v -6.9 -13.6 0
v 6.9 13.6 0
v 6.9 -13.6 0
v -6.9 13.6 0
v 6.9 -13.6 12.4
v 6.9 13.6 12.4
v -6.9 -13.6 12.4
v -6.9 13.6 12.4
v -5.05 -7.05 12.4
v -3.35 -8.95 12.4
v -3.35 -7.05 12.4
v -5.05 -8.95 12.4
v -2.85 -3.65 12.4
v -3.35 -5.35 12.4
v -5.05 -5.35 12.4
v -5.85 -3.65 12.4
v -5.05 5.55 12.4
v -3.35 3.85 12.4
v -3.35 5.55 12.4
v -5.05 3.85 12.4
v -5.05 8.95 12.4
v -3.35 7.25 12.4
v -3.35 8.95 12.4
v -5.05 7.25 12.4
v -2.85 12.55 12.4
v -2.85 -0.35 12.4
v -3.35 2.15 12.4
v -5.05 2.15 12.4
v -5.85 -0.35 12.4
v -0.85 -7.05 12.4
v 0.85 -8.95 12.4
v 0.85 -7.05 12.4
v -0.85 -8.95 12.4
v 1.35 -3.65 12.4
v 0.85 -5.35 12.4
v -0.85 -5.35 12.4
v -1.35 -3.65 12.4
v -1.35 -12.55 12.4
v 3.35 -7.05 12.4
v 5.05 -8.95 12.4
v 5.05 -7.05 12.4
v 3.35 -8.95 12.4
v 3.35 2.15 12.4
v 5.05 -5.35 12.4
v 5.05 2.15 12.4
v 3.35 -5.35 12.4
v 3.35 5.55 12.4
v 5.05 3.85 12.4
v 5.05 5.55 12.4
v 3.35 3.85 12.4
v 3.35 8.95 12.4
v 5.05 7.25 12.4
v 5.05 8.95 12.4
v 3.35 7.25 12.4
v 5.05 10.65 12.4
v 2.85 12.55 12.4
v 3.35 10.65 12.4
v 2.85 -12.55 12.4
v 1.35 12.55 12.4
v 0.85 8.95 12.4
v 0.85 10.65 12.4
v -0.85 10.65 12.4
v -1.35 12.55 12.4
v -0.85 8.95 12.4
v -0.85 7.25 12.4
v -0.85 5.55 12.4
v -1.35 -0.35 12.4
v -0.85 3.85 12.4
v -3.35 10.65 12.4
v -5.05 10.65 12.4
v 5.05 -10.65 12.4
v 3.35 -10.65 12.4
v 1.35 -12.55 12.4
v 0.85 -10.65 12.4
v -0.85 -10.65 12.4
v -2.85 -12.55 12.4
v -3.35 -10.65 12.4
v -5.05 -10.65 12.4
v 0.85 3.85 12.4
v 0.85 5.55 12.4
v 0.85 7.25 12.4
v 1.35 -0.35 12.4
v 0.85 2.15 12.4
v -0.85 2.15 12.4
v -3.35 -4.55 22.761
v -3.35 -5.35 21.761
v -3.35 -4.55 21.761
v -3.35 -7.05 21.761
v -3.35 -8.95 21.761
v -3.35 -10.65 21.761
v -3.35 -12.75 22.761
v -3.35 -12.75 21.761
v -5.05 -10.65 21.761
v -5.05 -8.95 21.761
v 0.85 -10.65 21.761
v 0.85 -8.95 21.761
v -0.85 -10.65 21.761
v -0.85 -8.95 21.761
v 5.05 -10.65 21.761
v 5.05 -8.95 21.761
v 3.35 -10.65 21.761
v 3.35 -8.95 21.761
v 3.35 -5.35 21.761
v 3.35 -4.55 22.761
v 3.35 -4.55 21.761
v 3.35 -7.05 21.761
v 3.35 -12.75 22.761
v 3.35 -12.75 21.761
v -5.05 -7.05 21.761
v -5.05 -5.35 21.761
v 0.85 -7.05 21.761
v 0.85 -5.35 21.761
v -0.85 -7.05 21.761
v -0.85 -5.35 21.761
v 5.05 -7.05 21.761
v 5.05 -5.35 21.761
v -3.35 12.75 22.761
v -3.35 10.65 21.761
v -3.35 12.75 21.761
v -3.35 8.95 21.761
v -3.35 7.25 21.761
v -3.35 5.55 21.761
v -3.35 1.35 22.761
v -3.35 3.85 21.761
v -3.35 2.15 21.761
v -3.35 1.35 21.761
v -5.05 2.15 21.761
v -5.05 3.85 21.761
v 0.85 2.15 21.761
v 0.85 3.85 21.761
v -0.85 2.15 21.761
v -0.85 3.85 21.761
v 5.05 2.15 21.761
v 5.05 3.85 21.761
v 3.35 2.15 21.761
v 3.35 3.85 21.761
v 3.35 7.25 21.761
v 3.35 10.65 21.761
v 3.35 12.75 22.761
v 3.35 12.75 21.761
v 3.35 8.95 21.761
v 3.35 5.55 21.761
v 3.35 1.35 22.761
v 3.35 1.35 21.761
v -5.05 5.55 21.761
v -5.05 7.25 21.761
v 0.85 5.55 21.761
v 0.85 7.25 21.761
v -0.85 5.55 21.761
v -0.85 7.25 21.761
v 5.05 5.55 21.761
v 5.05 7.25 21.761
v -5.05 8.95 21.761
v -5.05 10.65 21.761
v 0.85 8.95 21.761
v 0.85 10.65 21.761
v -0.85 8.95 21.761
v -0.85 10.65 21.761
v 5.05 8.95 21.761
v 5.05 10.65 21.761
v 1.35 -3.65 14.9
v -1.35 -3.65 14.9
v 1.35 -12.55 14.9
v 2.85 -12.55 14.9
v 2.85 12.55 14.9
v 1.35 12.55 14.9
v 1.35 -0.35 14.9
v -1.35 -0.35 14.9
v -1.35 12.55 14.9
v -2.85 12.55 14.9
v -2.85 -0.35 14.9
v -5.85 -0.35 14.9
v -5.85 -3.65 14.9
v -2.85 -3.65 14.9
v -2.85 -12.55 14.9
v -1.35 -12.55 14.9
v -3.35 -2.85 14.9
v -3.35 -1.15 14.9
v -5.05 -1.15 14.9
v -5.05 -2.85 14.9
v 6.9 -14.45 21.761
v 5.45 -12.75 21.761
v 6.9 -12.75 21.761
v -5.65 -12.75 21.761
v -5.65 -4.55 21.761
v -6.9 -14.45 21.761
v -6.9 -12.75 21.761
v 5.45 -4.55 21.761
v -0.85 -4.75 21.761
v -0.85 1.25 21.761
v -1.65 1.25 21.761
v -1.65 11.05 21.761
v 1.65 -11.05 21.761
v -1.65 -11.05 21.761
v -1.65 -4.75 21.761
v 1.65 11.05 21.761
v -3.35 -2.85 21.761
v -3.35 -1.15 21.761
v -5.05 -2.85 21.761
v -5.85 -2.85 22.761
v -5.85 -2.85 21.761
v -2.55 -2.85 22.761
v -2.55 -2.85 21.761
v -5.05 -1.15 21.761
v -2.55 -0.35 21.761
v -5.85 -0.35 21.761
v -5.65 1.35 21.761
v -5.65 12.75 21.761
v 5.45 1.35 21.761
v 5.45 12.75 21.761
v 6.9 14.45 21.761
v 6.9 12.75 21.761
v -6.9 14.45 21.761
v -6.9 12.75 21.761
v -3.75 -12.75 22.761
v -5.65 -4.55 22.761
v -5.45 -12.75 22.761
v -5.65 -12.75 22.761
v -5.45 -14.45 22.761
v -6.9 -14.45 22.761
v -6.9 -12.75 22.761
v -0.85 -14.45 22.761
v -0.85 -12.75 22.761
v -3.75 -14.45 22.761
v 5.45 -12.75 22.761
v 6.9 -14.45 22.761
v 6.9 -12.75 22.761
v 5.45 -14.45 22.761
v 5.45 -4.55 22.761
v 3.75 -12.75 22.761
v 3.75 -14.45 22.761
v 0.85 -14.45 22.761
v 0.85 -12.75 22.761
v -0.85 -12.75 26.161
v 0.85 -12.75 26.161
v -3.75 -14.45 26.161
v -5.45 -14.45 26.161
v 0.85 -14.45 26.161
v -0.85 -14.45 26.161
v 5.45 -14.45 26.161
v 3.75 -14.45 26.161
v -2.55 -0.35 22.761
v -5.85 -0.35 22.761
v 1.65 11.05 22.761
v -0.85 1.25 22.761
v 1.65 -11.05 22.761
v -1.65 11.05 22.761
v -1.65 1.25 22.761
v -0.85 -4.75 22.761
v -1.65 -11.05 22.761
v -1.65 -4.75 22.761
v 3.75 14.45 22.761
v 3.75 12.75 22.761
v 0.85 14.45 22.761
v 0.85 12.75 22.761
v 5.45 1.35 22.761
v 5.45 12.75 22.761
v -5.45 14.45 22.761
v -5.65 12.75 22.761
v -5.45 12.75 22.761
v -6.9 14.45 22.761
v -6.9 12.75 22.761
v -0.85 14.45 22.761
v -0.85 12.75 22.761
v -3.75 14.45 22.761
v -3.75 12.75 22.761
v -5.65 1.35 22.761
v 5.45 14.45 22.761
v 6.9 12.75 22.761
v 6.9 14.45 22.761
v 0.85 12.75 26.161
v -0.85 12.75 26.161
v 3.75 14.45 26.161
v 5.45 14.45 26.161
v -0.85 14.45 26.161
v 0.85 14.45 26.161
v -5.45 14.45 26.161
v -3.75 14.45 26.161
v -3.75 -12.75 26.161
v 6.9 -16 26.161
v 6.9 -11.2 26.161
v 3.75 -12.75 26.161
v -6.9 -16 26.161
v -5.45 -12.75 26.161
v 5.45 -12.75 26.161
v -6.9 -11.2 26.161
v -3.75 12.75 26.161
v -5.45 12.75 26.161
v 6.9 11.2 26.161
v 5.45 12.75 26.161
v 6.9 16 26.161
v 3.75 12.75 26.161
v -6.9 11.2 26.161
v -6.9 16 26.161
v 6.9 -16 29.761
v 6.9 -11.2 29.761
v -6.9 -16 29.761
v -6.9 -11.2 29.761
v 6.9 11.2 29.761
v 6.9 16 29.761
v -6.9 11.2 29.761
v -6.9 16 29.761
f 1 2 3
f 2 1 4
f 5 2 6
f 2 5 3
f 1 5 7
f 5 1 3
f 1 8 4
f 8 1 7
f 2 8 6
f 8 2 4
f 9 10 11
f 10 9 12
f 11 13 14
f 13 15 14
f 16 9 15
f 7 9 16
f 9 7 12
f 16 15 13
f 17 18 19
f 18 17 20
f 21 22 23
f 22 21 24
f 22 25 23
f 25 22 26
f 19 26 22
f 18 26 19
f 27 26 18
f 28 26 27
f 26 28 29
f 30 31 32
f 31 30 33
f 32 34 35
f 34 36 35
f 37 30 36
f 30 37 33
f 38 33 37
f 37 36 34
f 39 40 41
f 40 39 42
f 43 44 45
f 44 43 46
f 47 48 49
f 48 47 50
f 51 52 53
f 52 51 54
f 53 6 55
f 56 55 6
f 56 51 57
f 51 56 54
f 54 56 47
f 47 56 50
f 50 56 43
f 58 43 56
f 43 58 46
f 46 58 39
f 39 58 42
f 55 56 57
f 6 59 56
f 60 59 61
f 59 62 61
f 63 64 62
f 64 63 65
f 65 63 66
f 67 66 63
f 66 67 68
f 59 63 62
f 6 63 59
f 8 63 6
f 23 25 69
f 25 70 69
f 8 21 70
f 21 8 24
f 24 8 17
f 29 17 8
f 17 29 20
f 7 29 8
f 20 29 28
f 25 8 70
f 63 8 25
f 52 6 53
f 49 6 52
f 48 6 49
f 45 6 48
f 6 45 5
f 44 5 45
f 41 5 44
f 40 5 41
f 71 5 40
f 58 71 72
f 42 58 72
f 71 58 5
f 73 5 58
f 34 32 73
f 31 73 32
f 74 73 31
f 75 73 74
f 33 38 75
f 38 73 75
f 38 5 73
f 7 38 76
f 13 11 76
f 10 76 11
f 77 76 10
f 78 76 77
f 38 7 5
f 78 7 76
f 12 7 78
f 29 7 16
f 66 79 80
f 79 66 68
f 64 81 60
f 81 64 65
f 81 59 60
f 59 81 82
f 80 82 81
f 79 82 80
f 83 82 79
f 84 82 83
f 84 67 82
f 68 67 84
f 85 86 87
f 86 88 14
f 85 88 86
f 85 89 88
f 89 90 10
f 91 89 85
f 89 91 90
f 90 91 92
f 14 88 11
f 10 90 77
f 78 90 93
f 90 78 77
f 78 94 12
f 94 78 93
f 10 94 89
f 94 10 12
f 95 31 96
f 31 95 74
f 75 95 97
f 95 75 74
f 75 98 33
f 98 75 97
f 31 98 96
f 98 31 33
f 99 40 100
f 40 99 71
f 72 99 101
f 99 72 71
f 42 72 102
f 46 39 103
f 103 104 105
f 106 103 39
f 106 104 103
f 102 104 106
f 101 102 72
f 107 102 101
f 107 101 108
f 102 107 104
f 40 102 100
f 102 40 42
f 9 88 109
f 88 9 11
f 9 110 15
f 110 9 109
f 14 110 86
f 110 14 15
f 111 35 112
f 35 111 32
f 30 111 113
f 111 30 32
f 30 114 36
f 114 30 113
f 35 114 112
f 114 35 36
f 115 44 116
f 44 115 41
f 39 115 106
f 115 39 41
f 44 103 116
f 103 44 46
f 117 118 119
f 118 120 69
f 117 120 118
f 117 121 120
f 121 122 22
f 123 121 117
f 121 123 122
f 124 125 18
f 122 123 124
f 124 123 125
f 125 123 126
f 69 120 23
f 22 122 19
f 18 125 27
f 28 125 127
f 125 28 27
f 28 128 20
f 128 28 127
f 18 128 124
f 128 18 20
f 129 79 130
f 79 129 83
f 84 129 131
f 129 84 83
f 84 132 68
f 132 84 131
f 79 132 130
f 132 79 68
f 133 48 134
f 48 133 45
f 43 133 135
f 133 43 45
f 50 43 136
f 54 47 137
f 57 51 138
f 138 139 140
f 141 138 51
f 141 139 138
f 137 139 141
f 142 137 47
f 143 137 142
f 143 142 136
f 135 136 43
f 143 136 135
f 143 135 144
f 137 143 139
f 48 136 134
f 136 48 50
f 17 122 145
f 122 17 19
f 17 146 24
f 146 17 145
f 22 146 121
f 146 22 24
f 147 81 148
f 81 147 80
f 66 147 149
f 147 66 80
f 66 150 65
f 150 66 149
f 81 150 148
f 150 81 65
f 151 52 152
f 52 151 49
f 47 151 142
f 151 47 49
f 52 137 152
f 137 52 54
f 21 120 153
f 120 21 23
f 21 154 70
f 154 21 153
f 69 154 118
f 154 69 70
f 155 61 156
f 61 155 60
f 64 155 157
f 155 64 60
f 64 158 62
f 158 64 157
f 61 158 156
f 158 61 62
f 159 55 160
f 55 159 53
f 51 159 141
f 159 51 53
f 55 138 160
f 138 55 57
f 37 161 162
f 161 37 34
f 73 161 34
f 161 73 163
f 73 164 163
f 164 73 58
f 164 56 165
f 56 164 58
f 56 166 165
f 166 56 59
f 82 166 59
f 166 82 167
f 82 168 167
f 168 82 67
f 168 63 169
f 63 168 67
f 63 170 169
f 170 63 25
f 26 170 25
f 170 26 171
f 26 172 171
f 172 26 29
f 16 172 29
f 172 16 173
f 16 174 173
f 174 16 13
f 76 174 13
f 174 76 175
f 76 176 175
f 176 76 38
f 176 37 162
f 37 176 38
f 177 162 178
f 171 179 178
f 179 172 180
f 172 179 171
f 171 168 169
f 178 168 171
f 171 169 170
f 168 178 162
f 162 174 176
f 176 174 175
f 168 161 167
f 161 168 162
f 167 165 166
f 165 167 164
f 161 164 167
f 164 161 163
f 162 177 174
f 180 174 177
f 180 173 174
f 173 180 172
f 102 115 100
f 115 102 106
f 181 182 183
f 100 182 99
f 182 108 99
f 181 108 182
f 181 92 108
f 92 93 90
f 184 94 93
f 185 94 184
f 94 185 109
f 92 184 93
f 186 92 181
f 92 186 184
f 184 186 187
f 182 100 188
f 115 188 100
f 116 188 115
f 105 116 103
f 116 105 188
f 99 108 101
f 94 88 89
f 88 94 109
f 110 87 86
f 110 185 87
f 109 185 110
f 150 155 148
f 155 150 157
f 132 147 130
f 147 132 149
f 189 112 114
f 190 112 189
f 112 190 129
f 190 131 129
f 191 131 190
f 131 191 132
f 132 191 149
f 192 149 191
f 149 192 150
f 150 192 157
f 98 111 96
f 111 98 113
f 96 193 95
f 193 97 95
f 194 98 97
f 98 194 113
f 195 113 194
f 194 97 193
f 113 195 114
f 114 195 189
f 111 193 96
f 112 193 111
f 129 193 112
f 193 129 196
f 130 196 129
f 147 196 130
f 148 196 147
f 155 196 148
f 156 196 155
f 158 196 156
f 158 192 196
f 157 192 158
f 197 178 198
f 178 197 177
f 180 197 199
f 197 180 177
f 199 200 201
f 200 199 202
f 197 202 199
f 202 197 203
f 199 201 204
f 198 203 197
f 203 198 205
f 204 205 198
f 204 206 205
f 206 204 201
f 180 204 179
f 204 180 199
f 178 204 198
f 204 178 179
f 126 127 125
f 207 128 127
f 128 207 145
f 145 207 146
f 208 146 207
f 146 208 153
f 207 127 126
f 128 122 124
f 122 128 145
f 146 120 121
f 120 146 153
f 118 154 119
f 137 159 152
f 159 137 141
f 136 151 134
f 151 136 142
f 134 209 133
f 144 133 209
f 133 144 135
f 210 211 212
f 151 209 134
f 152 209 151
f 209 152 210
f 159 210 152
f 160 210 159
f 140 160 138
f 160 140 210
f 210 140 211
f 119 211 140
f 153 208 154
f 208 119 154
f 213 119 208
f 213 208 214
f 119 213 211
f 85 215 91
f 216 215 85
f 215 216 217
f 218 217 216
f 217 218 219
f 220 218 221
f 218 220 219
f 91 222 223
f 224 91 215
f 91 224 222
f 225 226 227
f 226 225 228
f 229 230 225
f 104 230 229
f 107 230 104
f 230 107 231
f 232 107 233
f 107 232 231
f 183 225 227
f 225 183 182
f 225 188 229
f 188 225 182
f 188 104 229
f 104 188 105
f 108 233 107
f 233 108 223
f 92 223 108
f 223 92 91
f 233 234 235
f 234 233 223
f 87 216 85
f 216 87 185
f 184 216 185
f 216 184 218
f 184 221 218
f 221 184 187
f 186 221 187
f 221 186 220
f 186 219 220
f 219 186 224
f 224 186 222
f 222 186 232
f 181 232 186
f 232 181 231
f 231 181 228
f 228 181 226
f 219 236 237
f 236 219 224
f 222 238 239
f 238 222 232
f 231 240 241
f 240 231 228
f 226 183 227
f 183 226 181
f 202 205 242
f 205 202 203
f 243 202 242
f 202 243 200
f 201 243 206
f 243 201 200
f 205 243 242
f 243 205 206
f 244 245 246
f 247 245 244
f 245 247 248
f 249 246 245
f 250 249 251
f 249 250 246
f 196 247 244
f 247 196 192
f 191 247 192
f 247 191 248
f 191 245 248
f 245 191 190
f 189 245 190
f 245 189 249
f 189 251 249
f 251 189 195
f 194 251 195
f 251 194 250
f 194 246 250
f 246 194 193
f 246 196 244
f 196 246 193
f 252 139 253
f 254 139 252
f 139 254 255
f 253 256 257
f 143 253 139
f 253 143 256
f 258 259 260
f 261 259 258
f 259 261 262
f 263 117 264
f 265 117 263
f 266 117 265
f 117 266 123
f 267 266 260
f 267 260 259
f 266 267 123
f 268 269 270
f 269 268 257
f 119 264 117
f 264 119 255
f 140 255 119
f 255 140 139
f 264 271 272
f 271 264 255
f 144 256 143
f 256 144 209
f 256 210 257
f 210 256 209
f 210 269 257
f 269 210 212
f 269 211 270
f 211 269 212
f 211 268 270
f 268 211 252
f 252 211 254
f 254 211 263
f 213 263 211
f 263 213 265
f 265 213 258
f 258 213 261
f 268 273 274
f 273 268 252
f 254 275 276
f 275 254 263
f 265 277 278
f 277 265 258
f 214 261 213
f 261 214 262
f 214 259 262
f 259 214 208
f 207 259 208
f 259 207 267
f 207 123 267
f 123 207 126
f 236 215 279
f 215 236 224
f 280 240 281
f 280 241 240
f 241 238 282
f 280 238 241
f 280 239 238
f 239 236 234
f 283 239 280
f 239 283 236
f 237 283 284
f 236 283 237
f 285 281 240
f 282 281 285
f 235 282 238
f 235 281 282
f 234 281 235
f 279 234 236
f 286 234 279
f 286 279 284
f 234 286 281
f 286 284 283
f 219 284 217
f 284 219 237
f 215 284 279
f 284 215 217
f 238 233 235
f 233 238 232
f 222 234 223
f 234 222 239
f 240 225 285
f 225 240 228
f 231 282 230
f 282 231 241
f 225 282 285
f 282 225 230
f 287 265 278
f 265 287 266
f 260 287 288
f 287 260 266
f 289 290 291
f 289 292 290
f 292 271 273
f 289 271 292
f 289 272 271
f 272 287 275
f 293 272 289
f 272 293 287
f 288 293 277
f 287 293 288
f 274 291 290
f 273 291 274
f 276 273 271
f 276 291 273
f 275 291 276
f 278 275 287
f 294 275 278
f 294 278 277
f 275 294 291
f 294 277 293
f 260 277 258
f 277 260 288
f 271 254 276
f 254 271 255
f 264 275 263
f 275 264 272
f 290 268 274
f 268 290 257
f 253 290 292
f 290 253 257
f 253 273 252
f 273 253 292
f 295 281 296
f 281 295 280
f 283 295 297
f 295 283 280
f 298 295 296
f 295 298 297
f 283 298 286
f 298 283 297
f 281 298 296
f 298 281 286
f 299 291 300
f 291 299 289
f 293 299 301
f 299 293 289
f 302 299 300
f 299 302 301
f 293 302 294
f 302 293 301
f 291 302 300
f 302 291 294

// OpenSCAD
// Generated by SolidPython 0.4.2 on 2020-09-29 23:20:58
//!OpenSCAD

scale(v = 0.0100000000) {
	translate(v = [-690, -1360, 0]) {
		union() {
			color(c = [0.4000000000, 0.4000000000, 0.4000000000]) {
				translate(v = [0, 0, 0]) {
					linear_extrude(height = 1000.0000000000) {
						polygon(paths = [[0, 1, 2, 3]], points = [[0, 0], [0, 2720], [1380, 2720], [1380, 0]]);
					}
				}
			}
			color(c = [0.2000000000, 0.6000000000, 0.2000000000]) {
				translate(v = [0, 0, 1000.0000000000]) {
					linear_extrude(height = 120.0000000000) {
						polygon(paths = [[0, 1, 2, 3]], points = [[0, 1305], [0, 2720], [1380, 2720], [1380, 1305]]);
					}
				}
			}
			color(c = [0.4000000000, 0.4000000000, 0.4000000000]) {
				translate(v = [0, 0, 1000.0000000000]) {
					linear_extrude(height = 120.0000000000) {
						polygon(paths = [[0, 1, 2, 3]], points = [[0, 0], [0, 1305], [1380, 1305], [1380, 0]]);
					}
				}
			}
			color(c = [0.9000000000, 0.6000000000, 0.6000000000]) {
				translate(v = [0, 0, 1120.0000000000]) {
					linear_extrude(height = 120.0000000000) {
						polygon(paths = [[0, 1, 2, 3]], points = [[145, 1485], [145, 2485], [405, 2485], [405, 1485]]);
					}
				}
			}
			color(c = [0.9000000000, 0.6000000000, 0.6000000000]) {
				translate(v = [0, 0, 1120.0000000000]) {
					linear_extrude(height = 120.0000000000) {
						polygon(paths = [[0, 1, 2, 3]], points = [[555, 1485], [555, 2485], [825, 2485], [825, 1485]]);
					}
				}
			}
			color(c = [0.9000000000, 0.6000000000, 0.6000000000]) {
				translate(v = [0, 0, 1120.0000000000]) {
					linear_extrude(height = 120.0000000000) {
						polygon(paths = [[0, 1, 2, 3]], points = [[975, 1485], [975, 2485], [1235, 2485], [1235, 1485]]);
					}
				}
			}
			color(c = [0.9000000000, 0.6000000000, 0.9000000000]) {
				translate(v = [0, 0, 1120.0000000000]) {
					linear_extrude(height = 120.0000000000) {
						polygon(paths = [[0, 1, 2, 3]], points = [[145, 235], [145, 885], [405, 885], [405, 235]]);
					}
				}
			}
			color(c = [0.9000000000, 0.6000000000, 0.9000000000]) {
				translate(v = [0, 0, 1120.0000000000]) {
					linear_extrude(height = 120.0000000000) {
						polygon(paths = [[0, 1, 2, 3]], points = [[555, 235], [555, 885], [825, 885], [825, 235]]);
					}
				}
			}
			color(c = [0.9000000000, 0.6000000000, 0.9000000000]) {
				translate(v = [0, 0, 1120.0000000000]) {
					linear_extrude(height = 120.0000000000) {
						polygon(paths = [[0, 1, 2, 3]], points = [[975, 235], [975, 885], [1235, 885], [1235, 235]]);
					}
				}
			}
			color(c = [0.2000000000, 0.6000000000, 0.2000000000]) {
				translate(v = [0, 0, 1120.0000000000]) {
					linear_extrude(height = 120.0000000000) {
						difference() {
							polygon(paths = [[0, 1, 2, 3]], points = [[0, 1305], [0, 2720], [1380, 2720], [1380, 1305]]);
							polygon(paths = [[0, 1, 2, 3]], points = [[145, 1485], [405, 1485], [405, 2485], [145, 2485]]);
							polygon(paths = [[0, 1, 2, 3]], points = [[555, 1485], [825, 1485], [825, 2485], [555, 2485]]);
							polygon(paths = [[0, 1, 2, 3]], points = [[975, 1485], [1235, 1485], [1235, 2485], [975, 2485]]);
						}
					}
				}
			}
			color(c = [0.4000000000, 0.4000000000, 0.4000000000]) {
				translate(v = [0, 0, 1120.0000000000]) {
					linear_extrude(height = 120.0000000000) {
						difference() {
							polygon(paths = [[0, 1, 2, 3]], points = [[0, 0], [0, 1305], [1380, 1305], [1380, 0]]);
							polygon(paths = [[0, 1, 2, 3]], points = [[145, 235], [405, 235], [405, 885], [145, 885]]);
							polygon(paths = [[0, 1, 2, 3]], points = [[555, 235], [825, 235], [825, 885], [555, 885]]);
							polygon(paths = [[0, 1, 2, 3]], points = [[975, 235], [1235, 235], [1235, 885], [975, 885]]);
						}
					}
				}
			}
			color(c = [0.1000000000, 0.1000000000, 0.1000000000]) {
				translate(v = [0, 0, 1240.0000000000]) {
					linear_extrude(height = 70.0000000000) {
						polygon(paths = [[0, 1, 2, 3]], points = [[185, 295], [185, 465], [355, 465], [355, 295]]);
					}
				}
			}
			color(c = [0.1000000000, 0.1000000000, 0.1000000000]) {
				translate(v = [0, 0, 1240.0000000000]) {
					linear_extrude(height = 70.0000000000) {
						polygon(paths = [[0, 1, 2, 3]], points = [[605, 295], [605, 465], [775, 465], [775, 295]]);
					}
				}
			}
			color(c = [0.1000000000, 0.1000000000, 0.1000000000]) {
				translate(v = [0, 0, 1240.0000000000]) {
					linear_extrude(height = 70.0000000000) {
						polygon(paths = [[0, 1, 2, 3]], points = [[1025, 295], [1025, 465], [1195, 465], [1195, 295]]);
					}
				}
			}
			color(c = [0.1000000000, 0.1000000000, 0.1000000000]) {
				translate(v = [0, 0, 1240.0000000000]) {
					linear_extrude(height = 70.0000000000) {
						polygon(paths = [[0, 1, 2, 3]], points = [[185, 655], [185, 825], [355, 825], [355, 655]]);
					}
				}
			}
			color(c = [0.1000000000, 0.1000000000, 0.1000000000]) {
				translate(v = [0, 0, 1240.0000000000]) {
					linear_extrude(height = 70.0000000000) {
						polygon(paths = [[0, 1, 2, 3]], points = [[605, 655], [605, 825], [775, 825], [775, 655]]);
					}
				}
			}
			color(c = [0.1000000000, 0.1000000000, 0.1000000000]) {
				translate(v = [0, 0, 1240.0000000000]) {
					linear_extrude(height = 70.0000000000) {
						polygon(paths = [[0, 1, 2, 3]], points = [[1025, 655], [1025, 825], [1195, 825], [1195, 655]]);
					}
				}
			}
			color(c = [0.1000000000, 0.1000000000, 0.1000000000]) {
				translate(v = [0, 0, 1240.0000000000]) {
					linear_extrude(height = 70.0000000000) {
						polygon(paths = [[0, 1, 2, 3]], points = [[185, 1575], [185, 1745], [355, 1745], [355, 1575]]);
					}
				}
			}
			color(c = [0.1000000000, 0.1000000000, 0.1000000000]) {
				translate(v = [0, 0, 1240.0000000000]) {
					linear_extrude(height = 70.0000000000) {
						polygon(paths = [[0, 1, 2, 3]], points = [[605, 1575], [605, 1745], [775, 1745], [775, 1575]]);
					}
				}
			}
			color(c = [0.1000000000, 0.1000000000, 0.1000000000]) {
				translate(v = [0, 0, 1240.0000000000]) {
					linear_extrude(height = 70.0000000000) {
						polygon(paths = [[0, 1, 2, 3]], points = [[1025, 1575], [1025, 1745], [1195, 1745], [1195, 1575]]);
					}
				}
			}
			color(c = [0.1000000000, 0.1000000000, 0.1000000000]) {
				translate(v = [0, 0, 1240.0000000000]) {
					linear_extrude(height = 70.0000000000) {
						polygon(paths = [[0, 1, 2, 3]], points = [[185, 1915], [185, 2085], [355, 2085], [355, 1915]]);
					}
				}
			}
			color(c = [0.1000000000, 0.1000000000, 0.1000000000]) {
				translate(v = [0, 0, 1240.0000000000]) {
					linear_extrude(height = 70.0000000000) {
						polygon(paths = [[0, 1, 2, 3]], points = [[605, 1915], [605, 2085], [775, 2085], [775, 1915]]);
					}
				}
			}
			color(c = [0.1000000000, 0.1000000000, 0.1000000000]) {
				translate(v = [0, 0, 1240.0000000000]) {
					linear_extrude(height = 70.0000000000) {
						polygon(paths = [[0, 1, 2, 3]], points = [[1025, 1915], [1025, 2085], [1195, 2085], [1195, 1915]]);
					}
				}
			}
			color(c = [0.1000000000, 0.1000000000, 0.1000000000]) {
				translate(v = [0, 0, 1240.0000000000]) {
					linear_extrude(height = 70.0000000000) {
						polygon(paths = [[0, 1, 2, 3]], points = [[185, 2255], [185, 2425], [355, 2425], [355, 2255]]);
					}
				}
			}
			color(c = [0.1000000000, 0.1000000000, 0.1000000000]) {
				translate(v = [0, 0, 1240.0000000000]) {
					linear_extrude(height = 70.0000000000) {
						polygon(paths = [[0, 1, 2, 3]], points = [[605, 2255], [605, 2425], [775, 2425], [775, 2255]]);
					}
				}
			}
			color(c = [0.1000000000, 0.1000000000, 0.1000000000]) {
				translate(v = [0, 0, 1240.0000000000]) {
					linear_extrude(height = 70.0000000000) {
						polygon(paths = [[0, 1, 2, 3]], points = [[1025, 2255], [1025, 2425], [1195, 2425], [1195, 2255]]);
					}
				}
			}
			color(c = [1.0000000000, 1.0000000000, 1.0000000000]) {
				translate(v = [0, 0, 1240.0000000000]) {
					linear_extrude(height = 70.0000000000) {
						polygon(paths = [[0, 1, 2, 3, 4, 5, 6, 7, 8, 9, 10, 11, 12, 13, 14, 15]], points = [[405, 105], [405, 995], [105, 995], [105, 1325], [405, 1325], [405, 2615], [555, 2615], [555, 1325], [825, 1325], [825, 2615], [975, 2615], [975, 105], [825, 105], [825, 995], [555, 995], [555, 105]]);
					}
				}
			}
			color(c = [0.1000000000, 0.1000000000, 0.1000000000]) {
				translate(v = [0, 0, 1310.0000000000]) {
					linear_extrude(height = 180.0000000000) {
						polygon(paths = [[0, 1, 2, 3]], points = [[185, 295], [185, 465], [355, 465], [355, 295]]);
					}
				}
			}
			color(c = [0.1000000000, 0.1000000000, 0.1000000000]) {
				translate(v = [0, 0, 1310.0000000000]) {
					linear_extrude(height = 180.0000000000) {
						polygon(paths = [[0, 1, 2, 3]], points = [[605, 295], [605, 465], [775, 465], [775, 295]]);
					}
				}
			}
			color(c = [0.1000000000, 0.1000000000, 0.1000000000]) {
				translate(v = [0, 0, 1310.0000000000]) {
					linear_extrude(height = 180.0000000000) {
						polygon(paths = [[0, 1, 2, 3]], points = [[1025, 295], [1025, 465], [1195, 465], [1195, 295]]);
					}
				}
			}
			color(c = [0.1000000000, 0.1000000000, 0.1000000000]) {
				translate(v = [0, 0, 1310.0000000000]) {
					linear_extrude(height = 180.0000000000) {
						polygon(paths = [[0, 1, 2, 3]], points = [[185, 655], [185, 825], [355, 825], [355, 655]]);
					}
				}
			}
			color(c = [0.1000000000, 0.1000000000, 0.1000000000]) {
				translate(v = [0, 0, 1310.0000000000]) {
					linear_extrude(height = 180.0000000000) {
						polygon(paths = [[0, 1, 2, 3]], points = [[605, 655], [605, 825], [775, 825], [775, 655]]);
					}
				}
			}
			color(c = [0.1000000000, 0.1000000000, 0.1000000000]) {
				translate(v = [0, 0, 1310.0000000000]) {
					linear_extrude(height = 180.0000000000) {
						polygon(paths = [[0, 1, 2, 3]], points = [[1025, 655], [1025, 825], [1195, 825], [1195, 655]]);
					}
				}
			}
			color(c = [0.1000000000, 0.1000000000, 0.1000000000]) {
				translate(v = [0, 0, 1310.0000000000]) {
					linear_extrude(height = 180.0000000000) {
						polygon(paths = [[0, 1, 2, 3]], points = [[185, 1575], [185, 1745], [355, 1745], [355, 1575]]);
					}
				}
			}
			color(c = [0.1000000000, 0.1000000000, 0.1000000000]) {
				translate(v = [0, 0, 1310.0000000000]) {
					linear_extrude(height = 180.0000000000) {
						polygon(paths = [[0, 1, 2, 3]], points = [[605, 1575], [605, 1745], [775, 1745], [775, 1575]]);
					}
				}
			}
			color(c = [0.1000000000, 0.1000000000, 0.1000000000]) {
				translate(v = [0, 0, 1310.0000000000]) {
					linear_extrude(height = 180.0000000000) {
						polygon(paths = [[0, 1, 2, 3]], points = [[1025, 1575], [1025, 1745], [1195, 1745], [1195, 1575]]);
					}
				}
			}
			color(c = [0.1000000000, 0.1000000000, 0.1000000000]) {
				translate(v = [0, 0, 1310.0000000000]) {
					linear_extrude(height = 180.0000000000) {
						polygon(paths = [[0, 1, 2, 3]], points = [[185, 1915], [185, 2085], [355, 2085], [355, 1915]]);
					}
				}
			}
			color(c = [0.1000000000, 0.1000000000, 0.1000000000]) {
				translate(v = [0, 0, 1310.0000000000]) {
					linear_extrude(height = 180.0000000000) {
						polygon(paths = [[0, 1, 2, 3]], points = [[605, 1915], [605, 2085], [775, 2085], [775, 1915]]);
					}
				}
			}
			color(c = [0.1000000000, 0.1000000000, 0.1000000000]) {
				translate(v = [0, 0, 1310.0000000000]) {
					linear_extrude(height = 180.0000000000) {
						polygon(paths = [[0, 1, 2, 3]], points = [[1025, 1915], [1025, 2085], [1195, 2085], [1195, 1915]]);
					}
				}
			}
			color(c = [0.1000000000, 0.1000000000, 0.1000000000]) {
				translate(v = [0, 0, 1310.0000000000]) {
					linear_extrude(height = 180.0000000000) {
						polygon(paths = [[0, 1, 2, 3]], points = [[185, 2255], [185, 2425], [355, 2425], [355, 2255]]);
					}
				}
			}
			color(c = [0.1000000000, 0.1000000000, 0.1000000000]) {
				translate(v = [0, 0, 1310.0000000000]) {
					linear_extrude(height = 180.0000000000) {
						polygon(paths = [[0, 1, 2, 3]], points = [[605, 2255], [605, 2425], [775, 2425], [775, 2255]]);
					}
				}
			}
			color(c = [0.1000000000, 0.1000000000, 0.1000000000]) {
				translate(v = [0, 0, 1310.0000000000]) {
					linear_extrude(height = 180.0000000000) {
						polygon(paths = [[0, 1, 2, 3]], points = [[1025, 2255], [1025, 2425], [1195, 2425], [1195, 2255]]);
					}
				}
			}
			color(c = [0.7000000000, 0, 0]) {
				translate(v = [0, 0, 1310.0000000000]) {
					linear_extrude(height = 180.0000000000) {
						polygon(paths = [[0, 1, 2, 3, 4, 5, 6, 7, 8, 9, 10, 11, 12, 13, 14, 15]], points = [[405, 105], [405, 995], [105, 995], [105, 1325], [405, 1325], [405, 2615], [555, 2615], [555, 1325], [825, 1325], [825, 2615], [975, 2615], [975, 105], [825, 105], [825, 995], [555, 995], [555, 105]]);
					}
				}
			}
			color(c = [0.1000000000, 0.1000000000, 0.1000000000]) {
				translate(v = [0, 0, 1490.0000000000]) {
					linear_extrude(height = 686.1000000000) {
						polygon(paths = [[0, 1, 2, 3]], points = [[185, 295], [185, 465], [355, 465], [355, 295]]);
					}
				}
			}
			color(c = [0.1000000000, 0.1000000000, 0.1000000000]) {
				translate(v = [0, 0, 1490.0000000000]) {
					linear_extrude(height = 686.1000000000) {
						polygon(paths = [[0, 1, 2, 3]], points = [[605, 295], [605, 465], [775, 465], [775, 295]]);
					}
				}
			}
			color(c = [0.1000000000, 0.1000000000, 0.1000000000]) {
				translate(v = [0, 0, 1490.0000000000]) {
					linear_extrude(height = 686.1000000000) {
						polygon(paths = [[0, 1, 2, 3]], points = [[1025, 295], [1025, 465], [1195, 465], [1195, 295]]);
					}
				}
			}
			color(c = [0.1000000000, 0.1000000000, 0.1000000000]) {
				translate(v = [0, 0, 1490.0000000000]) {
					linear_extrude(height = 686.1000000000) {
						polygon(paths = [[0, 1, 2, 3]], points = [[185, 655], [185, 825], [355, 825], [355, 655]]);
					}
				}
			}
			color(c = [0.1000000000, 0.1000000000, 0.1000000000]) {
				translate(v = [0, 0, 1490.0000000000]) {
					linear_extrude(height = 686.1000000000) {
						polygon(paths = [[0, 1, 2, 3]], points = [[605, 655], [605, 825], [775, 825], [775, 655]]);
					}
				}
			}
			color(c = [0.1000000000, 0.1000000000, 0.1000000000]) {
				translate(v = [0, 0, 1490.0000000000]) {
					linear_extrude(height = 686.1000000000) {
						polygon(paths = [[0, 1, 2, 3]], points = [[1025, 655], [1025, 825], [1195, 825], [1195, 655]]);
					}
				}
			}
			color(c = [0.1000000000, 0.1000000000, 0.1000000000]) {
				translate(v = [0, 0, 1490.0000000000]) {
					linear_extrude(height = 686.1000000000) {
						polygon(paths = [[0, 1, 2, 3]], points = [[185, 1075], [185, 1245], [355, 1245], [355, 1075]]);
					}
				}
			}
			color(c = [0.1000000000, 0.1000000000, 0.1000000000]) {
				translate(v = [0, 0, 1490.0000000000]) {
					linear_extrude(height = 686.1000000000) {
						polygon(paths = [[0, 1, 2, 3]], points = [[185, 1575], [185, 1745], [355, 1745], [355, 1575]]);
					}
				}
			}
			color(c = [0.1000000000, 0.1000000000, 0.1000000000]) {
				translate(v = [0, 0, 1490.0000000000]) {
					linear_extrude(height = 686.1000000000) {
						polygon(paths = [[0, 1, 2, 3]], points = [[605, 1575], [605, 1745], [775, 1745], [775, 1575]]);
					}
				}
			}
			color(c = [0.1000000000, 0.1000000000, 0.1000000000]) {
				translate(v = [0, 0, 1490.0000000000]) {
					linear_extrude(height = 686.1000000000) {
						polygon(paths = [[0, 1, 2, 3]], points = [[1025, 1575], [1025, 1745], [1195, 1745], [1195, 1575]]);
					}
				}
			}
			color(c = [0.1000000000, 0.1000000000, 0.1000000000]) {
				translate(v = [0, 0, 1490.0000000000]) {
					linear_extrude(height = 686.1000000000) {
						polygon(paths = [[0, 1, 2, 3]], points = [[185, 1915], [185, 2085], [355, 2085], [355, 1915]]);
					}
				}
			}
			color(c = [0.1000000000, 0.1000000000, 0.1000000000]) {
				translate(v = [0, 0, 1490.0000000000]) {
					linear_extrude(height = 686.1000000000) {
						polygon(paths = [[0, 1, 2, 3]], points = [[605, 1915], [605, 2085], [775, 2085], [775, 1915]]);
					}
				}
			}
			color(c = [0.1000000000, 0.1000000000, 0.1000000000]) {
				translate(v = [0, 0, 1490.0000000000]) {
					linear_extrude(height = 686.1000000000) {
						polygon(paths = [[0, 1, 2, 3]], points = [[1025, 1915], [1025, 2085], [1195, 2085], [1195, 1915]]);
					}
				}
			}
			color(c = [0.1000000000, 0.1000000000, 0.1000000000]) {
				translate(v = [0, 0, 1490.0000000000]) {
					linear_extrude(height = 686.1000000000) {
						polygon(paths = [[0, 1, 2, 3]], points = [[185, 2255], [185, 2425], [355, 2425], [355, 2255]]);
					}
				}
			}
			color(c = [0.1000000000, 0.1000000000, 0.1000000000]) {
				translate(v = [0, 0, 1490.0000000000]) {
					linear_extrude(height = 686.1000000000) {
						polygon(paths = [[0, 1, 2, 3]], points = [[605, 2255], [605, 2425], [775, 2425], [775, 2255]]);
					}
				}
			}
			color(c = [0.1000000000, 0.1000000000, 0.1000000000]) {
				translate(v = [0, 0, 1490.0000000000]) {
					linear_extrude(height = 686.1000000000) {
						polygon(paths = [[0, 1, 2, 3]], points = [[1025, 2255], [1025, 2425], [1195, 2425], [1195, 2255]]);
					}
				}
			}
			color(c = [0.9000000000, 0.6000000000, 0.6000000000]) {
				translate(v = [0, 0, 2176.1000000000]) {
					linear_extrude(height = 100.0000000000) {
						polygon(paths = [[0, 1, 2, 3, 4, 5, 6, 7, 8, 9, 10, 11]], points = [[0, -85], [0, 85], [125, 85], [125, 905], [355, 905], [355, 85], [1025, 85], [1025, 905], [1235, 905], [1235, 85], [1380, 85], [1380, -85]]);
					}
				}
			}
			color(c = [0.9000000000, 0.6000000000, 0.6000000000]) {
				translate(v = [0, 0, 2176.1000000000]) {
					linear_extrude(height = 100.0000000000) {
						polygon(paths = [[0, 1, 2, 3]], points = [[105, 1075], [105, 1325], [435, 1325], [435, 1075]]);
					}
				}
			}
			color(c = [0.9000000000, 0.6000000000, 0.6000000000]) {
				translate(v = [0, 0, 2176.1000000000]) {
					linear_extrude(height = 100.0000000000) {
						polygon(paths = [[0, 1, 2, 3, 4, 5, 6, 7]], points = [[525, 255], [525, 885], [605, 885], [605, 1485], [525, 1485], [525, 2465], [855, 2465], [855, 255]]);
					}
				}
			}
			color(c = [0.9000000000, 0.6000000000, 0.6000000000]) {
				translate(v = [0, 0, 2176.1000000000]) {
					linear_extrude(height = 100.0000000000) {
						polygon(paths = [[0, 1, 2, 3, 4, 5, 6, 7, 8, 9, 10, 11]], points = [[125, 1495], [125, 2635], [0, 2635], [0, 2805], [1380, 2805], [1380, 2635], [1235, 2635], [1235, 1495], [1025, 1495], [1025, 2635], [355, 2635], [355, 1495]]);
					}
				}
			}
			color(c = [0.5000000000, 0.5000000000, 0.5000000000]) {
				translate(v = [0, 0, 2276.1000000000]) {
					linear_extrude(height = 340.0000000000) {
						polygon(paths = [[0, 1, 2, 3]], points = [[145, -85], [145, 85], [315, 85], [315, -85]]);
					}
				}
			}
			color(c = [0.5000000000, 0.5000000000, 0.5000000000]) {
				translate(v = [0, 0, 2276.1000000000]) {
					linear_extrude(height = 340.0000000000) {
						polygon(paths = [[0, 1, 2, 3]], points = [[605, -85], [605, 85], [775, 85], [775, -85]]);
					}
				}
			}
			color(c = [0.5000000000, 0.5000000000, 0.5000000000]) {
				translate(v = [0, 0, 2276.1000000000]) {
					linear_extrude(height = 340.0000000000) {
						polygon(paths = [[0, 1, 2, 3]], points = [[1065, -85], [1065, 85], [1235, 85], [1235, -85]]);
					}
				}
			}
			color(c = [0.5000000000, 0.5000000000, 0.5000000000]) {
				translate(v = [0, 0, 2276.1000000000]) {
					linear_extrude(height = 340.0000000000) {
						polygon(paths = [[0, 1, 2, 3]], points = [[145, 2635], [145, 2805], [315, 2805], [315, 2635]]);
					}
				}
			}
			color(c = [0.5000000000, 0.5000000000, 0.5000000000]) {
				translate(v = [0, 0, 2276.1000000000]) {
					linear_extrude(height = 340.0000000000) {
						polygon(paths = [[0, 1, 2, 3]], points = [[605, 2635], [605, 2805], [775, 2805], [775, 2635]]);
					}
				}
			}
			color(c = [0.5000000000, 0.5000000000, 0.5000000000]) {
				translate(v = [0, 0, 2276.1000000000]) {
					linear_extrude(height = 340.0000000000) {
						polygon(paths = [[0, 1, 2, 3]], points = [[1065, 2635], [1065, 2805], [1235, 2805], [1235, 2635]]);
					}
				}
			}
			color(c = [0.3000000000, 0.3000000000, 1]) {
				translate(v = [0, 0, 2616.1000000000]) {
					linear_extrude(height = 360.0000000000) {
						polygon(paths = [[0, 1, 2, 3]], points = [[0, -240], [0, 240], [1380, 240], [1380, -240]]);
					}
				}
			}
			color(c = [0.3000000000, 0.3000000000, 1]) {
				translate(v = [0, 0, 2616.1000000000]) {
					linear_extrude(height = 360.0000000000) {
						polygon(paths = [[0, 1, 2, 3]], points = [[0, 2480], [0, 2960], [1380, 2960], [1380, 2480]]);
					}
				}
			}
		}
	}
}
